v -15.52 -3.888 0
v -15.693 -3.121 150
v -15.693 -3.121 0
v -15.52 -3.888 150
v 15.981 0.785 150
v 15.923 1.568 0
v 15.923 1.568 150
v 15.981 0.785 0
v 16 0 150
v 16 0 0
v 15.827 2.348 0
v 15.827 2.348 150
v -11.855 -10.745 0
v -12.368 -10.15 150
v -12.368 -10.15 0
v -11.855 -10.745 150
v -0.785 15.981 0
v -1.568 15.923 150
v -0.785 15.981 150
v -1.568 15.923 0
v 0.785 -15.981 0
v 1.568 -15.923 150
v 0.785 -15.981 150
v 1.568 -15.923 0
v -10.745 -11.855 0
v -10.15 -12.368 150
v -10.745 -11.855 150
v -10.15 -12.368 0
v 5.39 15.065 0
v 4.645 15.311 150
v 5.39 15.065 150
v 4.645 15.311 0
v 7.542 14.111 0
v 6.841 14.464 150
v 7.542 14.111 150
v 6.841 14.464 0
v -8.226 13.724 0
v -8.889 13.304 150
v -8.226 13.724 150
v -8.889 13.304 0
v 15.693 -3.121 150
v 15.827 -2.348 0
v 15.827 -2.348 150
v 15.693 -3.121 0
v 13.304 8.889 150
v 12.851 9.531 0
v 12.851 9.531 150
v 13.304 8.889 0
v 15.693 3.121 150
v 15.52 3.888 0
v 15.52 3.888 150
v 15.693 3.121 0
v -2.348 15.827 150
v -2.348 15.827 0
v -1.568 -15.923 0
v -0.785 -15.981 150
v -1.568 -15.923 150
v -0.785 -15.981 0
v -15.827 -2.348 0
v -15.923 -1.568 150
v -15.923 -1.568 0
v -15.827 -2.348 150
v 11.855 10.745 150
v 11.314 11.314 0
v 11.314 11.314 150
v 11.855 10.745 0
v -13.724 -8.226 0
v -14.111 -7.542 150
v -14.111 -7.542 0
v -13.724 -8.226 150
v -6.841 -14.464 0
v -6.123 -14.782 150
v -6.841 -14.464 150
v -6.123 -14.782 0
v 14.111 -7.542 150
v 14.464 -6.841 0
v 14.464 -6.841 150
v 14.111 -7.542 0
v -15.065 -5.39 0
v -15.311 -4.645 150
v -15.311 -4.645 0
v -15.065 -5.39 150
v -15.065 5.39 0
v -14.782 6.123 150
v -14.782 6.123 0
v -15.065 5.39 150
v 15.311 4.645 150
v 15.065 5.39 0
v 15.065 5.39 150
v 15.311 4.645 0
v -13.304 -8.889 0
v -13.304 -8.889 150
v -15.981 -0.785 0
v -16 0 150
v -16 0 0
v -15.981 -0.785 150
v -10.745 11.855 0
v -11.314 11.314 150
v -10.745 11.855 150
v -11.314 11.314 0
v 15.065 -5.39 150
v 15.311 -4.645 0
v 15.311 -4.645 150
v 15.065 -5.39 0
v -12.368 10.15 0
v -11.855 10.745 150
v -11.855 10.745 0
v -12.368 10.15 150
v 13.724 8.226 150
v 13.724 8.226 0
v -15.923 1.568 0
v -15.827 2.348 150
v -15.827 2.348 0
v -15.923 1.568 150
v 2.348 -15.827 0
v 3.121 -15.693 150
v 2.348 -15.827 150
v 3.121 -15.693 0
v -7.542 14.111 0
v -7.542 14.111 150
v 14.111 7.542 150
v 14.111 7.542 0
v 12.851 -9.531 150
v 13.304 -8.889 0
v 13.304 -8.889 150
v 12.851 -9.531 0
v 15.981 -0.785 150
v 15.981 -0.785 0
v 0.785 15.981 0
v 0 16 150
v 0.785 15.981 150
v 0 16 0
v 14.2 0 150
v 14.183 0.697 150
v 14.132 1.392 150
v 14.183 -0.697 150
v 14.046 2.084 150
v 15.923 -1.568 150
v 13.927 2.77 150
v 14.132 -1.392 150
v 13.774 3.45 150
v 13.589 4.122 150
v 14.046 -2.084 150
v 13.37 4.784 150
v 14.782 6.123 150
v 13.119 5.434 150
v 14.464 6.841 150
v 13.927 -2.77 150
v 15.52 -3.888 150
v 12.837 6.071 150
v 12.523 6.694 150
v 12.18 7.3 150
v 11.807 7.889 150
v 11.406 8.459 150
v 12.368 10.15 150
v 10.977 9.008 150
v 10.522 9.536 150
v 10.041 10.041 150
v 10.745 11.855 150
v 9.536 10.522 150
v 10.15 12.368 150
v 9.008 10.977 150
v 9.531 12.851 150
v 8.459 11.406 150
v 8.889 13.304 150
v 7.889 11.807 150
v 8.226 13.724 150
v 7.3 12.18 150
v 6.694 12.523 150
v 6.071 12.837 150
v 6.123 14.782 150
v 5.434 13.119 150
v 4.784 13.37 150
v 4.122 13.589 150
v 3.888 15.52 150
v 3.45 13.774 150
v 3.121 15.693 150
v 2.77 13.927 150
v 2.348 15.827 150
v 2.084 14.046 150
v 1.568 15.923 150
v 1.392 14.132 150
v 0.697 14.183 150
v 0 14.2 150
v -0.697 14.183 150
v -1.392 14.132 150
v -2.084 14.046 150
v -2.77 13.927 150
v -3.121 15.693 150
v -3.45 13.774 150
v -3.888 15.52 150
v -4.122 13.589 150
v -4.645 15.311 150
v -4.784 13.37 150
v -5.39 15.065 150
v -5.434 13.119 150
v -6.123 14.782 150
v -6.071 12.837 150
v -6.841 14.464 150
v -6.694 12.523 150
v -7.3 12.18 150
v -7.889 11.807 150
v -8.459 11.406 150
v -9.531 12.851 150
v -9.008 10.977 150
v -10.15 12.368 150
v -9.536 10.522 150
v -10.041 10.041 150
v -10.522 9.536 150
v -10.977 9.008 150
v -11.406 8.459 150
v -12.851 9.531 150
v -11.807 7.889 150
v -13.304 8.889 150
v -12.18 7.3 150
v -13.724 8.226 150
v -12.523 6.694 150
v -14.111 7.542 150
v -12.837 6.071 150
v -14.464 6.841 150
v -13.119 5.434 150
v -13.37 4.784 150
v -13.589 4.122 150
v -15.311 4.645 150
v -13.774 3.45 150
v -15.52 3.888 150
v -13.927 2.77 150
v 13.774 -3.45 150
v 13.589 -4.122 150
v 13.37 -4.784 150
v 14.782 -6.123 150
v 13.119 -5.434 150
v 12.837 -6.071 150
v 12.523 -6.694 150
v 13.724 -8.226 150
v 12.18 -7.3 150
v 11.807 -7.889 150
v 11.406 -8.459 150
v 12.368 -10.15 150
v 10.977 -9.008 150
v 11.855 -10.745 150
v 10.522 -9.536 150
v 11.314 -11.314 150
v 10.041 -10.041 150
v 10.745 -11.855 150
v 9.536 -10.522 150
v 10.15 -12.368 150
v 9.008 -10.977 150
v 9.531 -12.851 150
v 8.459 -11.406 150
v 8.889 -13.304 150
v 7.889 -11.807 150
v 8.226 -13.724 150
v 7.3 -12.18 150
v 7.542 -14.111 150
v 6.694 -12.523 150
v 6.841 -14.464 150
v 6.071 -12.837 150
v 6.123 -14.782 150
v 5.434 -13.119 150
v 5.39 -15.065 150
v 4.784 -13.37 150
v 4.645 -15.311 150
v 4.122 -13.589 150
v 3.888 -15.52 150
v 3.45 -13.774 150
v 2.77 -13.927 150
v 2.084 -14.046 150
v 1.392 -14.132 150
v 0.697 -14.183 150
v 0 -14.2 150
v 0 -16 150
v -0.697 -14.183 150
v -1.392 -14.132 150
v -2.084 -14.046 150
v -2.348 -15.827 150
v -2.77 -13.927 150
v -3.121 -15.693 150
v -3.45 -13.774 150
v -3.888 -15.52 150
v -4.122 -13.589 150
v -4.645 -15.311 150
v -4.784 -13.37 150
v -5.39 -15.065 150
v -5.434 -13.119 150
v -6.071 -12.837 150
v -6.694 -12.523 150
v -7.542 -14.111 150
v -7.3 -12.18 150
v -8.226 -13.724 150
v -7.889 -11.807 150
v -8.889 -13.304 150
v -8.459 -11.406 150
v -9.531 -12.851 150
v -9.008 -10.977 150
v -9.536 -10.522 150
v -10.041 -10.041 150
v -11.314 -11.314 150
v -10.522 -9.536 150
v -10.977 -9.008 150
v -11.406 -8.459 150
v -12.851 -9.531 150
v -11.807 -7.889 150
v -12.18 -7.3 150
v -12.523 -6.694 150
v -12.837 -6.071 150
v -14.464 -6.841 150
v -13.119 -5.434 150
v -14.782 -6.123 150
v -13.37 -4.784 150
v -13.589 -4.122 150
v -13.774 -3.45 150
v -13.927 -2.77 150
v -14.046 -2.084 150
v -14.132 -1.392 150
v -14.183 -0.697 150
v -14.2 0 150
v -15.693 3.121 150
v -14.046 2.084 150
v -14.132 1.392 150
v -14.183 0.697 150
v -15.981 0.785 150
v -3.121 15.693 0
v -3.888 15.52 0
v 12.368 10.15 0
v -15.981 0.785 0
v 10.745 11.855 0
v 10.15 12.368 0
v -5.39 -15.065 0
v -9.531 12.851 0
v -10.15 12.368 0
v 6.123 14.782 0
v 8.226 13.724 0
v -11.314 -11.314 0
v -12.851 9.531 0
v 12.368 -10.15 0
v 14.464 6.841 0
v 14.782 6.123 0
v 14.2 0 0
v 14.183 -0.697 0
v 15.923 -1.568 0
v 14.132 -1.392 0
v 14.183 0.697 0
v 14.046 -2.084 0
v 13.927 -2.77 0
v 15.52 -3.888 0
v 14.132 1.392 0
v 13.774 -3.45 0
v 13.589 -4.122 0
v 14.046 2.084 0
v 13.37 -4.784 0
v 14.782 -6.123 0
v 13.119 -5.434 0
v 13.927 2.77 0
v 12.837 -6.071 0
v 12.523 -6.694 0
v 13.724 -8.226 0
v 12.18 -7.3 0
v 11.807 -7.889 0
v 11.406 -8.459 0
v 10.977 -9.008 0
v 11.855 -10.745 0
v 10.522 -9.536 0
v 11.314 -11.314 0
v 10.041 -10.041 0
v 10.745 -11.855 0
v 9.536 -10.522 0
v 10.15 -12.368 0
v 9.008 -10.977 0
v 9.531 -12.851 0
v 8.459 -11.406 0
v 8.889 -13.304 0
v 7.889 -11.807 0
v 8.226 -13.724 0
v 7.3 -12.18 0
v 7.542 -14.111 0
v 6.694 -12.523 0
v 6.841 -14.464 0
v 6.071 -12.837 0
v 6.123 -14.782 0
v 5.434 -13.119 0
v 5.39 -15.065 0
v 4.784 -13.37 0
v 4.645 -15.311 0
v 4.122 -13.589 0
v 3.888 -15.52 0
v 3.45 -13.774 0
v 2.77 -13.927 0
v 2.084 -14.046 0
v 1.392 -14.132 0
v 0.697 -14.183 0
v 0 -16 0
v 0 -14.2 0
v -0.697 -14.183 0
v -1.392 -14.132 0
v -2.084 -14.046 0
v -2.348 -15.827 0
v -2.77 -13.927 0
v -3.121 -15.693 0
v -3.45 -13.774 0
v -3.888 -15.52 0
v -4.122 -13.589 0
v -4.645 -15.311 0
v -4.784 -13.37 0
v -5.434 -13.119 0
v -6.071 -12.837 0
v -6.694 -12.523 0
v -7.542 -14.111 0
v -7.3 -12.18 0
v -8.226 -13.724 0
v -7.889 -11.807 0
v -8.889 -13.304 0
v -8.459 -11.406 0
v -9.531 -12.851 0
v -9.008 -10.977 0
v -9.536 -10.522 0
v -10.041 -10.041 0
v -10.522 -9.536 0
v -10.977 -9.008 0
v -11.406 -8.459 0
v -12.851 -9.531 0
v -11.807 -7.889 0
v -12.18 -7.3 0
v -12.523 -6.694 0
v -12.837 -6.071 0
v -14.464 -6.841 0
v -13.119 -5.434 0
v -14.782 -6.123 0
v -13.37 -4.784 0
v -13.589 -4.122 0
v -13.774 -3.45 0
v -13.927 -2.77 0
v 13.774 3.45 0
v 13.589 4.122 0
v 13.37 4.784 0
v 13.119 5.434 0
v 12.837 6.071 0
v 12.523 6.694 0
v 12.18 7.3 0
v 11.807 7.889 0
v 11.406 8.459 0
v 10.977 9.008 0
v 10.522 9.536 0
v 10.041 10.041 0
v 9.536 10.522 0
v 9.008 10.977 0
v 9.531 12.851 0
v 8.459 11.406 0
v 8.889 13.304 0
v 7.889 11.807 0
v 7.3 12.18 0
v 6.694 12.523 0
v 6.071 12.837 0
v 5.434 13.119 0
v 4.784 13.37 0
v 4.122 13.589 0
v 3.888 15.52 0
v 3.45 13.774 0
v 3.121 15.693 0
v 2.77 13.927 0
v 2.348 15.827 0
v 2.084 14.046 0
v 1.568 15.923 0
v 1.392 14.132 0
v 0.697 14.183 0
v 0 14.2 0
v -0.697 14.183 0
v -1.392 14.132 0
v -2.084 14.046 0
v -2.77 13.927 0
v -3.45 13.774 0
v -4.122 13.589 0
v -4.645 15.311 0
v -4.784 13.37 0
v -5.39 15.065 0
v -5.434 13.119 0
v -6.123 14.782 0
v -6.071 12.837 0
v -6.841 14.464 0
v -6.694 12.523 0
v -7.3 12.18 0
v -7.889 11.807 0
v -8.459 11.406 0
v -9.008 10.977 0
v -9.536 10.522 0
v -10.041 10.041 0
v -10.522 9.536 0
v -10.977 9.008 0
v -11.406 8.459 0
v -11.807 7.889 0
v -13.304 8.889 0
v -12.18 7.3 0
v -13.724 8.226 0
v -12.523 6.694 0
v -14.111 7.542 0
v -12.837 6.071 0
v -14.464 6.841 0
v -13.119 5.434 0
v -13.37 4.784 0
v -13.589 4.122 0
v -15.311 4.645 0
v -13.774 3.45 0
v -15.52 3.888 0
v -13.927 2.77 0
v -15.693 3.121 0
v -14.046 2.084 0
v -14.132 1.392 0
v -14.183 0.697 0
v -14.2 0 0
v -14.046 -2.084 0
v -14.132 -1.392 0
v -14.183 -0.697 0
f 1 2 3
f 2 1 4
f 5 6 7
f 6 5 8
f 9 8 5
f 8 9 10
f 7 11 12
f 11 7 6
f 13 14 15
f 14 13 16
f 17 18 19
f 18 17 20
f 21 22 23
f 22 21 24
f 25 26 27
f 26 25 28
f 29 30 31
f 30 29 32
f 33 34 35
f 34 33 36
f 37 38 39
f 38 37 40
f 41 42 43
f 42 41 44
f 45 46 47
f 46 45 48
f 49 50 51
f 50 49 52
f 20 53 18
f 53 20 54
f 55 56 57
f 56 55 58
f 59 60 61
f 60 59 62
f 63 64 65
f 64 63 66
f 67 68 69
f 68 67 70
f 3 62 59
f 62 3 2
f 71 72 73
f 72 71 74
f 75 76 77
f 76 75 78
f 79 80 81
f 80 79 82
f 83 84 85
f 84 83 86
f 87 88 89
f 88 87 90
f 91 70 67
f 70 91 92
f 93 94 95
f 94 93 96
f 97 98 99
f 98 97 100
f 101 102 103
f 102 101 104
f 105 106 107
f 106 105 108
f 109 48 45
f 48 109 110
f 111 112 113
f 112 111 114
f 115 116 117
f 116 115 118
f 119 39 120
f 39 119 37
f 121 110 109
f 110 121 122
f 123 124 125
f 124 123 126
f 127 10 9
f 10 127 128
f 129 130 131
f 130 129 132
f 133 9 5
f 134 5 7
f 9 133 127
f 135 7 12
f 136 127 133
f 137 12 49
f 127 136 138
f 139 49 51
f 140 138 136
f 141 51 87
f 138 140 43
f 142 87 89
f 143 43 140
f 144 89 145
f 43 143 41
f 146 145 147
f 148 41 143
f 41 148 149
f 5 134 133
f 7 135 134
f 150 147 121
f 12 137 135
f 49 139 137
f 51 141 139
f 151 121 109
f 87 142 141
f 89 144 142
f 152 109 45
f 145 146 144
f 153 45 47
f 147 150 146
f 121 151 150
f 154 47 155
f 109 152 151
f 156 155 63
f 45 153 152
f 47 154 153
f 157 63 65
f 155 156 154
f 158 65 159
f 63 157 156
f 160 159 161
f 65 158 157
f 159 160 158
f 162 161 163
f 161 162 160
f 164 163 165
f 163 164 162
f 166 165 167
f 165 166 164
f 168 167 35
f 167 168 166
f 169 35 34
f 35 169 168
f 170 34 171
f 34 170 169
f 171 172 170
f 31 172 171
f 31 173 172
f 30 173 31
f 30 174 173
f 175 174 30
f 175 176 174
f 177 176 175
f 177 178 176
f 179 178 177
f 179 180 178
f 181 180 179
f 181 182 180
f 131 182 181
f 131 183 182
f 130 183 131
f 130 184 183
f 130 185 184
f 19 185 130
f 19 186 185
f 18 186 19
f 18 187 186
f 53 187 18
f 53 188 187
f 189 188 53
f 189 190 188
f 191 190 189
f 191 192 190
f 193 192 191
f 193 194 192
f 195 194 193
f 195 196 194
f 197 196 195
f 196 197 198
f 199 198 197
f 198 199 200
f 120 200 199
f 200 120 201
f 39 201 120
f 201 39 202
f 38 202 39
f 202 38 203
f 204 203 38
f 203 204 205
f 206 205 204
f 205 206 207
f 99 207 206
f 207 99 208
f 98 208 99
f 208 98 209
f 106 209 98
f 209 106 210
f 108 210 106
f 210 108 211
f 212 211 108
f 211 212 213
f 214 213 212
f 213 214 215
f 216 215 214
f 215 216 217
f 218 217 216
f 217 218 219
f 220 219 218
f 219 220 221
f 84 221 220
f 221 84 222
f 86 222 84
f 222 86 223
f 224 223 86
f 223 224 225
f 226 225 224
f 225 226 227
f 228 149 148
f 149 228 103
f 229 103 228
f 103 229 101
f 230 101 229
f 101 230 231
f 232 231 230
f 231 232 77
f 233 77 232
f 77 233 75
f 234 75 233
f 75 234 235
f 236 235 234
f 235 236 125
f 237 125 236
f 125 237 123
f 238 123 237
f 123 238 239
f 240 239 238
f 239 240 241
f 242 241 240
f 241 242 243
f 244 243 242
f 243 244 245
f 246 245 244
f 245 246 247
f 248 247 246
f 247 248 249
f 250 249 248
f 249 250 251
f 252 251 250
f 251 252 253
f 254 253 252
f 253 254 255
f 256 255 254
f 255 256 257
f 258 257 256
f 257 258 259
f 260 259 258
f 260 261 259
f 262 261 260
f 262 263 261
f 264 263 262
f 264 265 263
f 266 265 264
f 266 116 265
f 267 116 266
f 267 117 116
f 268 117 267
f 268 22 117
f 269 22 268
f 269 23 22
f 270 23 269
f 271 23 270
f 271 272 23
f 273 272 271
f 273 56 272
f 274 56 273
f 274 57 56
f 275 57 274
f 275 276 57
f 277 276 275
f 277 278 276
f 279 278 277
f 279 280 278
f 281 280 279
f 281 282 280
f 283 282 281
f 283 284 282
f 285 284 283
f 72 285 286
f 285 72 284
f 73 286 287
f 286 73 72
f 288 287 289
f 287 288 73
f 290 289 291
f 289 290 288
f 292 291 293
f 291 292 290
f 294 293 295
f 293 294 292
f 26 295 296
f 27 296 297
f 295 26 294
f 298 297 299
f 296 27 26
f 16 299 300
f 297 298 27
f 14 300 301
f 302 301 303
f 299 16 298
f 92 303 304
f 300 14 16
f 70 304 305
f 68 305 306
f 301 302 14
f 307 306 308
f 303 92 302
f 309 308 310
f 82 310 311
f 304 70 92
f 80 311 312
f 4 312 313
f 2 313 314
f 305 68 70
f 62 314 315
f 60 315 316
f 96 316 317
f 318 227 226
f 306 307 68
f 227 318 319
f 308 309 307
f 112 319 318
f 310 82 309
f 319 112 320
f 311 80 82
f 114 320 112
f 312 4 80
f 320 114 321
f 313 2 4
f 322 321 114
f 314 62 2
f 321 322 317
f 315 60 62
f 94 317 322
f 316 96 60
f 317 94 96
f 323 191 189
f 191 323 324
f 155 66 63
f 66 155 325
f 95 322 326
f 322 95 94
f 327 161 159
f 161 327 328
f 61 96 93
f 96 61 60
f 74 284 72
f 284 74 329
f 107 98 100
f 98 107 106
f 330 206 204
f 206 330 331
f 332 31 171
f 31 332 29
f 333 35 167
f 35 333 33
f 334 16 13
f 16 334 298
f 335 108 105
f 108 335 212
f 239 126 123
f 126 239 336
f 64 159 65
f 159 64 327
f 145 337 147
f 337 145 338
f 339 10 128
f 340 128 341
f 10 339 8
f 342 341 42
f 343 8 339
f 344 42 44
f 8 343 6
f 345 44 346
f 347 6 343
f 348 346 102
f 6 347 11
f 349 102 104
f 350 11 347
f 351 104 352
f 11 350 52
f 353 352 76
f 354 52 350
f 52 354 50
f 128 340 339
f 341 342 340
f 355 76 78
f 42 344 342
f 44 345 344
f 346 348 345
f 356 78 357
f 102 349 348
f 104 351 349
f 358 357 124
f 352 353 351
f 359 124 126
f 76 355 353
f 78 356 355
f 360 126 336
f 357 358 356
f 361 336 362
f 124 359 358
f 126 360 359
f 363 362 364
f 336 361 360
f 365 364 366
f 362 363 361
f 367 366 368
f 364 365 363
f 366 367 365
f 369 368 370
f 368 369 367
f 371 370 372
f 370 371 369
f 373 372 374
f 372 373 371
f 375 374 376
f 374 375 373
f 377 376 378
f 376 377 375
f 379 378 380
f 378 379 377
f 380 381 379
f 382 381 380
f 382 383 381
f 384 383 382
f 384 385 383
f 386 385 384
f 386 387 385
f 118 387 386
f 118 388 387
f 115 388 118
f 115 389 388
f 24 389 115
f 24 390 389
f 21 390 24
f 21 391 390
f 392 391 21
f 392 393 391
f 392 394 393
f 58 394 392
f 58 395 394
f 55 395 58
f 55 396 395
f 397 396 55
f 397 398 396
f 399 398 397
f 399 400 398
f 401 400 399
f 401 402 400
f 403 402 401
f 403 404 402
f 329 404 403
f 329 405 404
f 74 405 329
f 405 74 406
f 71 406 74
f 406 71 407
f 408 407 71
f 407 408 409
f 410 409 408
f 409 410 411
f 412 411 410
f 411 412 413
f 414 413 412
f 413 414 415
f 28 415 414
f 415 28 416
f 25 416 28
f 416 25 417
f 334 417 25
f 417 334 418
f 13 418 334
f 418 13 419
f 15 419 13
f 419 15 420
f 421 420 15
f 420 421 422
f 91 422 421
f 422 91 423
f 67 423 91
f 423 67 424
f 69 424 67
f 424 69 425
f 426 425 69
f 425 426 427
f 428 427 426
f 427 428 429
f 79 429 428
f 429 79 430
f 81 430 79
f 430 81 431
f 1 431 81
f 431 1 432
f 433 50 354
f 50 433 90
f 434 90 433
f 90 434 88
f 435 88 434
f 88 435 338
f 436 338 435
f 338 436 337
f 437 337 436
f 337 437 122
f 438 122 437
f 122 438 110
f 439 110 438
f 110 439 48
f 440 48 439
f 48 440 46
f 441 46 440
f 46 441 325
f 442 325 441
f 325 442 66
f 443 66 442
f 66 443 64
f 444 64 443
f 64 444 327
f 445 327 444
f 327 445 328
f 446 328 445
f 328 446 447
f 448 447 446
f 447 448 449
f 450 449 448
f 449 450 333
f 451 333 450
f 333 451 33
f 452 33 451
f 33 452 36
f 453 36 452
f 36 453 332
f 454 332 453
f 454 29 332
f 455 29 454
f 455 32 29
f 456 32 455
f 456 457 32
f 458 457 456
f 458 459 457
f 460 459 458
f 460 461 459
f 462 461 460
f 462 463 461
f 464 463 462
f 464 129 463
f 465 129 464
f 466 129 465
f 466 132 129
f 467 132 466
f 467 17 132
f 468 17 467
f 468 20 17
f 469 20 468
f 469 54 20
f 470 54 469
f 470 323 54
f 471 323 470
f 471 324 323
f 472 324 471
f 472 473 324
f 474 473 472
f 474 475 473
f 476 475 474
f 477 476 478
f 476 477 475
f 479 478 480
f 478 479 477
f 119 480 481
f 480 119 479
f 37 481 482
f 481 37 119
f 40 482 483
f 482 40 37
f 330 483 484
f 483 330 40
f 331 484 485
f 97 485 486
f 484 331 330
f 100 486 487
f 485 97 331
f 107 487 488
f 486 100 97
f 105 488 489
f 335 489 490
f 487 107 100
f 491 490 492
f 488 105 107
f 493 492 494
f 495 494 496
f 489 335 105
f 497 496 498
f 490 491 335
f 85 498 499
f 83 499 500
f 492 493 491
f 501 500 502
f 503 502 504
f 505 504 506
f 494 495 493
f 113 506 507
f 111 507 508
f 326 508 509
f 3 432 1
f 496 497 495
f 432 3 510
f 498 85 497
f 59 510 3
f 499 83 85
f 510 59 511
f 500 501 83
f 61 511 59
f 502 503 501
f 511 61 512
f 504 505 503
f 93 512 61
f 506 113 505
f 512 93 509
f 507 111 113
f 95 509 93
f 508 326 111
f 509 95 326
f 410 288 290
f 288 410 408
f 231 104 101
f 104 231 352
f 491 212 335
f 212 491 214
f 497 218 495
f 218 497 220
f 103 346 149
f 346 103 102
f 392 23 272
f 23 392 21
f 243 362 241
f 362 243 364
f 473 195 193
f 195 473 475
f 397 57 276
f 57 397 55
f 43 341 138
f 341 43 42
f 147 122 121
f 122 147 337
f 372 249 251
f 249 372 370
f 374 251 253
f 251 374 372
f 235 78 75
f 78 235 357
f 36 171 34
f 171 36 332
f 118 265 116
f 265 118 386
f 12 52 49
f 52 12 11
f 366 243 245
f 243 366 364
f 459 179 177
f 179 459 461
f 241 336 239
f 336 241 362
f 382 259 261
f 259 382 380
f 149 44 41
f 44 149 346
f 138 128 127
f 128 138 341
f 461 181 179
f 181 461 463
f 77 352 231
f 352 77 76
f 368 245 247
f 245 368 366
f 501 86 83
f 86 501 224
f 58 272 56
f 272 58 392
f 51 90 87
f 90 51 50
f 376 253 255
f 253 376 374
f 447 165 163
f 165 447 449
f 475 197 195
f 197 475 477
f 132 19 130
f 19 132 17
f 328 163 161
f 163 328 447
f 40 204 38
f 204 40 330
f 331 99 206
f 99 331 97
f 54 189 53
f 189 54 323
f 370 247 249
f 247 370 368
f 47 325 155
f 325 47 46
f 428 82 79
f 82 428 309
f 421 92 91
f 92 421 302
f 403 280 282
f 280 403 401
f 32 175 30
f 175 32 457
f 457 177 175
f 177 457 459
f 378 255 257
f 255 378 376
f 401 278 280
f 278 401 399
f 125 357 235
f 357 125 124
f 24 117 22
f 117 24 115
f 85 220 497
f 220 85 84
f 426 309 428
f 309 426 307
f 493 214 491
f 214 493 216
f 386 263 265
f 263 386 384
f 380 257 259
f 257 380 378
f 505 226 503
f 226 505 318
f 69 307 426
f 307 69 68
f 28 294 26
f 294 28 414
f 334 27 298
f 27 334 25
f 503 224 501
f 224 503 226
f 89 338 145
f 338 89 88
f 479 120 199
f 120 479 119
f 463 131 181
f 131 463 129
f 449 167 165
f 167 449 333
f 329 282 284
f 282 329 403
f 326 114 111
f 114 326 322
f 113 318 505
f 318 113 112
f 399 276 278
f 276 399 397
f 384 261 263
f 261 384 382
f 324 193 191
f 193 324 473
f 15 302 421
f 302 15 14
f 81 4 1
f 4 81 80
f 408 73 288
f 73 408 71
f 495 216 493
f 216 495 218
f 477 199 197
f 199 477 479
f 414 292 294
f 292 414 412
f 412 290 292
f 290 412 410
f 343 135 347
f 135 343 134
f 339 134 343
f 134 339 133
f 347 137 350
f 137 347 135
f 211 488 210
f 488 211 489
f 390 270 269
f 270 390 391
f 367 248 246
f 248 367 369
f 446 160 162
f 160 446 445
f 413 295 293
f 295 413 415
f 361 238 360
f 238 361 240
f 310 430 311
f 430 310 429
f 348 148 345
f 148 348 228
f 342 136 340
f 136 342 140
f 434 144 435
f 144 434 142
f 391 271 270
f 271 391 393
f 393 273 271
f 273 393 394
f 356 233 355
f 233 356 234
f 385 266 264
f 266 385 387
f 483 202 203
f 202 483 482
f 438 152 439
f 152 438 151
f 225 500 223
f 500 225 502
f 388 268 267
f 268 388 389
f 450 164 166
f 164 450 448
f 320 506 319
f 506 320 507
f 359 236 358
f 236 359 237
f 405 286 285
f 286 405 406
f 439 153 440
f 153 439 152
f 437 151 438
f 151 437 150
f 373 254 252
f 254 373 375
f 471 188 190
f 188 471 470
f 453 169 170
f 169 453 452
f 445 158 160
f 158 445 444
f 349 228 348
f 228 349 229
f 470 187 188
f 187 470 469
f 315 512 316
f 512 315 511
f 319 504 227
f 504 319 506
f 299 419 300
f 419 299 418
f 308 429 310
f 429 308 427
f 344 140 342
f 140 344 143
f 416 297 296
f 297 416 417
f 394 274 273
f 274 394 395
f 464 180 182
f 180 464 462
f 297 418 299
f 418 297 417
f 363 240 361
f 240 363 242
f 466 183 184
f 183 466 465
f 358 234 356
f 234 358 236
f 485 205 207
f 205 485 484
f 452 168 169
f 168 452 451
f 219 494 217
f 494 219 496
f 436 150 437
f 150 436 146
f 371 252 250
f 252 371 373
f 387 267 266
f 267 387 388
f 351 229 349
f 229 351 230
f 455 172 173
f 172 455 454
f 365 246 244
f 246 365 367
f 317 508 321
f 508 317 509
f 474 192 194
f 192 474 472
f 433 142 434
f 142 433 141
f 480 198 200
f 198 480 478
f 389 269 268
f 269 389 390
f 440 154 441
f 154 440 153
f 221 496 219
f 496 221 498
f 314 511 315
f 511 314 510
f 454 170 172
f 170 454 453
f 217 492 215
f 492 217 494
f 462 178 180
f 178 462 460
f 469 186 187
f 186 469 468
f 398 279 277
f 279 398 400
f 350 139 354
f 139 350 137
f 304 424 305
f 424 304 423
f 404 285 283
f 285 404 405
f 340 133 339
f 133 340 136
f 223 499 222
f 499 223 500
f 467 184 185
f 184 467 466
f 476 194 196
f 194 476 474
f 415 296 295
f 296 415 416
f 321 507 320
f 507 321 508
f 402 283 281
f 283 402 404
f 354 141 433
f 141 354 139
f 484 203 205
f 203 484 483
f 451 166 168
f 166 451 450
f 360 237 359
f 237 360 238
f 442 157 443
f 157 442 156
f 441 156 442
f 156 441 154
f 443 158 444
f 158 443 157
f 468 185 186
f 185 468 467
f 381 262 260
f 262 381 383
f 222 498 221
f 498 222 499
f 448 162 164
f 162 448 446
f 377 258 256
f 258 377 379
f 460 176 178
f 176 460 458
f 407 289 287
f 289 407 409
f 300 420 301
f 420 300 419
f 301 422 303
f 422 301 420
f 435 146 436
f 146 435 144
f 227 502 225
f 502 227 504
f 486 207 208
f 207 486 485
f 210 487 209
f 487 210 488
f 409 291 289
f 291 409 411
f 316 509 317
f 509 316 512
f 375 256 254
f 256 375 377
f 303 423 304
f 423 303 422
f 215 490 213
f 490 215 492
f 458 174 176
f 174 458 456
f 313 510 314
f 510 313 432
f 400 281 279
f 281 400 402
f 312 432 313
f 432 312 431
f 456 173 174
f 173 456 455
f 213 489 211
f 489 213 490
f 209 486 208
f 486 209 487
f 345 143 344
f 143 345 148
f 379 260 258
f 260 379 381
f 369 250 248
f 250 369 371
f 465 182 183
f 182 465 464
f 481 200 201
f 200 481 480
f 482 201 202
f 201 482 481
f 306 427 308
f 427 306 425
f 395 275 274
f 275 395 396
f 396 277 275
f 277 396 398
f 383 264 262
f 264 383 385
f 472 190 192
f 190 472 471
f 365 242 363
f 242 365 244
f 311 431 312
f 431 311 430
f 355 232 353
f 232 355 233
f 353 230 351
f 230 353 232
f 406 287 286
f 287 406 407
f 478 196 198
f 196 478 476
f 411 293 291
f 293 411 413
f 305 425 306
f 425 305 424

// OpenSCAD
$fn = 128;

// HT 32 pipe (approx.): OD 32 mm, wall 1.8 mm, length 150 mm
od = 32;
wall = 1.8;
id = od - 2*wall;
len = 150;

difference() {
  cylinder(h = len, d = od);
  translate([0,0,-0.1]) cylinder(h = len + 0.2, d = id);
}
